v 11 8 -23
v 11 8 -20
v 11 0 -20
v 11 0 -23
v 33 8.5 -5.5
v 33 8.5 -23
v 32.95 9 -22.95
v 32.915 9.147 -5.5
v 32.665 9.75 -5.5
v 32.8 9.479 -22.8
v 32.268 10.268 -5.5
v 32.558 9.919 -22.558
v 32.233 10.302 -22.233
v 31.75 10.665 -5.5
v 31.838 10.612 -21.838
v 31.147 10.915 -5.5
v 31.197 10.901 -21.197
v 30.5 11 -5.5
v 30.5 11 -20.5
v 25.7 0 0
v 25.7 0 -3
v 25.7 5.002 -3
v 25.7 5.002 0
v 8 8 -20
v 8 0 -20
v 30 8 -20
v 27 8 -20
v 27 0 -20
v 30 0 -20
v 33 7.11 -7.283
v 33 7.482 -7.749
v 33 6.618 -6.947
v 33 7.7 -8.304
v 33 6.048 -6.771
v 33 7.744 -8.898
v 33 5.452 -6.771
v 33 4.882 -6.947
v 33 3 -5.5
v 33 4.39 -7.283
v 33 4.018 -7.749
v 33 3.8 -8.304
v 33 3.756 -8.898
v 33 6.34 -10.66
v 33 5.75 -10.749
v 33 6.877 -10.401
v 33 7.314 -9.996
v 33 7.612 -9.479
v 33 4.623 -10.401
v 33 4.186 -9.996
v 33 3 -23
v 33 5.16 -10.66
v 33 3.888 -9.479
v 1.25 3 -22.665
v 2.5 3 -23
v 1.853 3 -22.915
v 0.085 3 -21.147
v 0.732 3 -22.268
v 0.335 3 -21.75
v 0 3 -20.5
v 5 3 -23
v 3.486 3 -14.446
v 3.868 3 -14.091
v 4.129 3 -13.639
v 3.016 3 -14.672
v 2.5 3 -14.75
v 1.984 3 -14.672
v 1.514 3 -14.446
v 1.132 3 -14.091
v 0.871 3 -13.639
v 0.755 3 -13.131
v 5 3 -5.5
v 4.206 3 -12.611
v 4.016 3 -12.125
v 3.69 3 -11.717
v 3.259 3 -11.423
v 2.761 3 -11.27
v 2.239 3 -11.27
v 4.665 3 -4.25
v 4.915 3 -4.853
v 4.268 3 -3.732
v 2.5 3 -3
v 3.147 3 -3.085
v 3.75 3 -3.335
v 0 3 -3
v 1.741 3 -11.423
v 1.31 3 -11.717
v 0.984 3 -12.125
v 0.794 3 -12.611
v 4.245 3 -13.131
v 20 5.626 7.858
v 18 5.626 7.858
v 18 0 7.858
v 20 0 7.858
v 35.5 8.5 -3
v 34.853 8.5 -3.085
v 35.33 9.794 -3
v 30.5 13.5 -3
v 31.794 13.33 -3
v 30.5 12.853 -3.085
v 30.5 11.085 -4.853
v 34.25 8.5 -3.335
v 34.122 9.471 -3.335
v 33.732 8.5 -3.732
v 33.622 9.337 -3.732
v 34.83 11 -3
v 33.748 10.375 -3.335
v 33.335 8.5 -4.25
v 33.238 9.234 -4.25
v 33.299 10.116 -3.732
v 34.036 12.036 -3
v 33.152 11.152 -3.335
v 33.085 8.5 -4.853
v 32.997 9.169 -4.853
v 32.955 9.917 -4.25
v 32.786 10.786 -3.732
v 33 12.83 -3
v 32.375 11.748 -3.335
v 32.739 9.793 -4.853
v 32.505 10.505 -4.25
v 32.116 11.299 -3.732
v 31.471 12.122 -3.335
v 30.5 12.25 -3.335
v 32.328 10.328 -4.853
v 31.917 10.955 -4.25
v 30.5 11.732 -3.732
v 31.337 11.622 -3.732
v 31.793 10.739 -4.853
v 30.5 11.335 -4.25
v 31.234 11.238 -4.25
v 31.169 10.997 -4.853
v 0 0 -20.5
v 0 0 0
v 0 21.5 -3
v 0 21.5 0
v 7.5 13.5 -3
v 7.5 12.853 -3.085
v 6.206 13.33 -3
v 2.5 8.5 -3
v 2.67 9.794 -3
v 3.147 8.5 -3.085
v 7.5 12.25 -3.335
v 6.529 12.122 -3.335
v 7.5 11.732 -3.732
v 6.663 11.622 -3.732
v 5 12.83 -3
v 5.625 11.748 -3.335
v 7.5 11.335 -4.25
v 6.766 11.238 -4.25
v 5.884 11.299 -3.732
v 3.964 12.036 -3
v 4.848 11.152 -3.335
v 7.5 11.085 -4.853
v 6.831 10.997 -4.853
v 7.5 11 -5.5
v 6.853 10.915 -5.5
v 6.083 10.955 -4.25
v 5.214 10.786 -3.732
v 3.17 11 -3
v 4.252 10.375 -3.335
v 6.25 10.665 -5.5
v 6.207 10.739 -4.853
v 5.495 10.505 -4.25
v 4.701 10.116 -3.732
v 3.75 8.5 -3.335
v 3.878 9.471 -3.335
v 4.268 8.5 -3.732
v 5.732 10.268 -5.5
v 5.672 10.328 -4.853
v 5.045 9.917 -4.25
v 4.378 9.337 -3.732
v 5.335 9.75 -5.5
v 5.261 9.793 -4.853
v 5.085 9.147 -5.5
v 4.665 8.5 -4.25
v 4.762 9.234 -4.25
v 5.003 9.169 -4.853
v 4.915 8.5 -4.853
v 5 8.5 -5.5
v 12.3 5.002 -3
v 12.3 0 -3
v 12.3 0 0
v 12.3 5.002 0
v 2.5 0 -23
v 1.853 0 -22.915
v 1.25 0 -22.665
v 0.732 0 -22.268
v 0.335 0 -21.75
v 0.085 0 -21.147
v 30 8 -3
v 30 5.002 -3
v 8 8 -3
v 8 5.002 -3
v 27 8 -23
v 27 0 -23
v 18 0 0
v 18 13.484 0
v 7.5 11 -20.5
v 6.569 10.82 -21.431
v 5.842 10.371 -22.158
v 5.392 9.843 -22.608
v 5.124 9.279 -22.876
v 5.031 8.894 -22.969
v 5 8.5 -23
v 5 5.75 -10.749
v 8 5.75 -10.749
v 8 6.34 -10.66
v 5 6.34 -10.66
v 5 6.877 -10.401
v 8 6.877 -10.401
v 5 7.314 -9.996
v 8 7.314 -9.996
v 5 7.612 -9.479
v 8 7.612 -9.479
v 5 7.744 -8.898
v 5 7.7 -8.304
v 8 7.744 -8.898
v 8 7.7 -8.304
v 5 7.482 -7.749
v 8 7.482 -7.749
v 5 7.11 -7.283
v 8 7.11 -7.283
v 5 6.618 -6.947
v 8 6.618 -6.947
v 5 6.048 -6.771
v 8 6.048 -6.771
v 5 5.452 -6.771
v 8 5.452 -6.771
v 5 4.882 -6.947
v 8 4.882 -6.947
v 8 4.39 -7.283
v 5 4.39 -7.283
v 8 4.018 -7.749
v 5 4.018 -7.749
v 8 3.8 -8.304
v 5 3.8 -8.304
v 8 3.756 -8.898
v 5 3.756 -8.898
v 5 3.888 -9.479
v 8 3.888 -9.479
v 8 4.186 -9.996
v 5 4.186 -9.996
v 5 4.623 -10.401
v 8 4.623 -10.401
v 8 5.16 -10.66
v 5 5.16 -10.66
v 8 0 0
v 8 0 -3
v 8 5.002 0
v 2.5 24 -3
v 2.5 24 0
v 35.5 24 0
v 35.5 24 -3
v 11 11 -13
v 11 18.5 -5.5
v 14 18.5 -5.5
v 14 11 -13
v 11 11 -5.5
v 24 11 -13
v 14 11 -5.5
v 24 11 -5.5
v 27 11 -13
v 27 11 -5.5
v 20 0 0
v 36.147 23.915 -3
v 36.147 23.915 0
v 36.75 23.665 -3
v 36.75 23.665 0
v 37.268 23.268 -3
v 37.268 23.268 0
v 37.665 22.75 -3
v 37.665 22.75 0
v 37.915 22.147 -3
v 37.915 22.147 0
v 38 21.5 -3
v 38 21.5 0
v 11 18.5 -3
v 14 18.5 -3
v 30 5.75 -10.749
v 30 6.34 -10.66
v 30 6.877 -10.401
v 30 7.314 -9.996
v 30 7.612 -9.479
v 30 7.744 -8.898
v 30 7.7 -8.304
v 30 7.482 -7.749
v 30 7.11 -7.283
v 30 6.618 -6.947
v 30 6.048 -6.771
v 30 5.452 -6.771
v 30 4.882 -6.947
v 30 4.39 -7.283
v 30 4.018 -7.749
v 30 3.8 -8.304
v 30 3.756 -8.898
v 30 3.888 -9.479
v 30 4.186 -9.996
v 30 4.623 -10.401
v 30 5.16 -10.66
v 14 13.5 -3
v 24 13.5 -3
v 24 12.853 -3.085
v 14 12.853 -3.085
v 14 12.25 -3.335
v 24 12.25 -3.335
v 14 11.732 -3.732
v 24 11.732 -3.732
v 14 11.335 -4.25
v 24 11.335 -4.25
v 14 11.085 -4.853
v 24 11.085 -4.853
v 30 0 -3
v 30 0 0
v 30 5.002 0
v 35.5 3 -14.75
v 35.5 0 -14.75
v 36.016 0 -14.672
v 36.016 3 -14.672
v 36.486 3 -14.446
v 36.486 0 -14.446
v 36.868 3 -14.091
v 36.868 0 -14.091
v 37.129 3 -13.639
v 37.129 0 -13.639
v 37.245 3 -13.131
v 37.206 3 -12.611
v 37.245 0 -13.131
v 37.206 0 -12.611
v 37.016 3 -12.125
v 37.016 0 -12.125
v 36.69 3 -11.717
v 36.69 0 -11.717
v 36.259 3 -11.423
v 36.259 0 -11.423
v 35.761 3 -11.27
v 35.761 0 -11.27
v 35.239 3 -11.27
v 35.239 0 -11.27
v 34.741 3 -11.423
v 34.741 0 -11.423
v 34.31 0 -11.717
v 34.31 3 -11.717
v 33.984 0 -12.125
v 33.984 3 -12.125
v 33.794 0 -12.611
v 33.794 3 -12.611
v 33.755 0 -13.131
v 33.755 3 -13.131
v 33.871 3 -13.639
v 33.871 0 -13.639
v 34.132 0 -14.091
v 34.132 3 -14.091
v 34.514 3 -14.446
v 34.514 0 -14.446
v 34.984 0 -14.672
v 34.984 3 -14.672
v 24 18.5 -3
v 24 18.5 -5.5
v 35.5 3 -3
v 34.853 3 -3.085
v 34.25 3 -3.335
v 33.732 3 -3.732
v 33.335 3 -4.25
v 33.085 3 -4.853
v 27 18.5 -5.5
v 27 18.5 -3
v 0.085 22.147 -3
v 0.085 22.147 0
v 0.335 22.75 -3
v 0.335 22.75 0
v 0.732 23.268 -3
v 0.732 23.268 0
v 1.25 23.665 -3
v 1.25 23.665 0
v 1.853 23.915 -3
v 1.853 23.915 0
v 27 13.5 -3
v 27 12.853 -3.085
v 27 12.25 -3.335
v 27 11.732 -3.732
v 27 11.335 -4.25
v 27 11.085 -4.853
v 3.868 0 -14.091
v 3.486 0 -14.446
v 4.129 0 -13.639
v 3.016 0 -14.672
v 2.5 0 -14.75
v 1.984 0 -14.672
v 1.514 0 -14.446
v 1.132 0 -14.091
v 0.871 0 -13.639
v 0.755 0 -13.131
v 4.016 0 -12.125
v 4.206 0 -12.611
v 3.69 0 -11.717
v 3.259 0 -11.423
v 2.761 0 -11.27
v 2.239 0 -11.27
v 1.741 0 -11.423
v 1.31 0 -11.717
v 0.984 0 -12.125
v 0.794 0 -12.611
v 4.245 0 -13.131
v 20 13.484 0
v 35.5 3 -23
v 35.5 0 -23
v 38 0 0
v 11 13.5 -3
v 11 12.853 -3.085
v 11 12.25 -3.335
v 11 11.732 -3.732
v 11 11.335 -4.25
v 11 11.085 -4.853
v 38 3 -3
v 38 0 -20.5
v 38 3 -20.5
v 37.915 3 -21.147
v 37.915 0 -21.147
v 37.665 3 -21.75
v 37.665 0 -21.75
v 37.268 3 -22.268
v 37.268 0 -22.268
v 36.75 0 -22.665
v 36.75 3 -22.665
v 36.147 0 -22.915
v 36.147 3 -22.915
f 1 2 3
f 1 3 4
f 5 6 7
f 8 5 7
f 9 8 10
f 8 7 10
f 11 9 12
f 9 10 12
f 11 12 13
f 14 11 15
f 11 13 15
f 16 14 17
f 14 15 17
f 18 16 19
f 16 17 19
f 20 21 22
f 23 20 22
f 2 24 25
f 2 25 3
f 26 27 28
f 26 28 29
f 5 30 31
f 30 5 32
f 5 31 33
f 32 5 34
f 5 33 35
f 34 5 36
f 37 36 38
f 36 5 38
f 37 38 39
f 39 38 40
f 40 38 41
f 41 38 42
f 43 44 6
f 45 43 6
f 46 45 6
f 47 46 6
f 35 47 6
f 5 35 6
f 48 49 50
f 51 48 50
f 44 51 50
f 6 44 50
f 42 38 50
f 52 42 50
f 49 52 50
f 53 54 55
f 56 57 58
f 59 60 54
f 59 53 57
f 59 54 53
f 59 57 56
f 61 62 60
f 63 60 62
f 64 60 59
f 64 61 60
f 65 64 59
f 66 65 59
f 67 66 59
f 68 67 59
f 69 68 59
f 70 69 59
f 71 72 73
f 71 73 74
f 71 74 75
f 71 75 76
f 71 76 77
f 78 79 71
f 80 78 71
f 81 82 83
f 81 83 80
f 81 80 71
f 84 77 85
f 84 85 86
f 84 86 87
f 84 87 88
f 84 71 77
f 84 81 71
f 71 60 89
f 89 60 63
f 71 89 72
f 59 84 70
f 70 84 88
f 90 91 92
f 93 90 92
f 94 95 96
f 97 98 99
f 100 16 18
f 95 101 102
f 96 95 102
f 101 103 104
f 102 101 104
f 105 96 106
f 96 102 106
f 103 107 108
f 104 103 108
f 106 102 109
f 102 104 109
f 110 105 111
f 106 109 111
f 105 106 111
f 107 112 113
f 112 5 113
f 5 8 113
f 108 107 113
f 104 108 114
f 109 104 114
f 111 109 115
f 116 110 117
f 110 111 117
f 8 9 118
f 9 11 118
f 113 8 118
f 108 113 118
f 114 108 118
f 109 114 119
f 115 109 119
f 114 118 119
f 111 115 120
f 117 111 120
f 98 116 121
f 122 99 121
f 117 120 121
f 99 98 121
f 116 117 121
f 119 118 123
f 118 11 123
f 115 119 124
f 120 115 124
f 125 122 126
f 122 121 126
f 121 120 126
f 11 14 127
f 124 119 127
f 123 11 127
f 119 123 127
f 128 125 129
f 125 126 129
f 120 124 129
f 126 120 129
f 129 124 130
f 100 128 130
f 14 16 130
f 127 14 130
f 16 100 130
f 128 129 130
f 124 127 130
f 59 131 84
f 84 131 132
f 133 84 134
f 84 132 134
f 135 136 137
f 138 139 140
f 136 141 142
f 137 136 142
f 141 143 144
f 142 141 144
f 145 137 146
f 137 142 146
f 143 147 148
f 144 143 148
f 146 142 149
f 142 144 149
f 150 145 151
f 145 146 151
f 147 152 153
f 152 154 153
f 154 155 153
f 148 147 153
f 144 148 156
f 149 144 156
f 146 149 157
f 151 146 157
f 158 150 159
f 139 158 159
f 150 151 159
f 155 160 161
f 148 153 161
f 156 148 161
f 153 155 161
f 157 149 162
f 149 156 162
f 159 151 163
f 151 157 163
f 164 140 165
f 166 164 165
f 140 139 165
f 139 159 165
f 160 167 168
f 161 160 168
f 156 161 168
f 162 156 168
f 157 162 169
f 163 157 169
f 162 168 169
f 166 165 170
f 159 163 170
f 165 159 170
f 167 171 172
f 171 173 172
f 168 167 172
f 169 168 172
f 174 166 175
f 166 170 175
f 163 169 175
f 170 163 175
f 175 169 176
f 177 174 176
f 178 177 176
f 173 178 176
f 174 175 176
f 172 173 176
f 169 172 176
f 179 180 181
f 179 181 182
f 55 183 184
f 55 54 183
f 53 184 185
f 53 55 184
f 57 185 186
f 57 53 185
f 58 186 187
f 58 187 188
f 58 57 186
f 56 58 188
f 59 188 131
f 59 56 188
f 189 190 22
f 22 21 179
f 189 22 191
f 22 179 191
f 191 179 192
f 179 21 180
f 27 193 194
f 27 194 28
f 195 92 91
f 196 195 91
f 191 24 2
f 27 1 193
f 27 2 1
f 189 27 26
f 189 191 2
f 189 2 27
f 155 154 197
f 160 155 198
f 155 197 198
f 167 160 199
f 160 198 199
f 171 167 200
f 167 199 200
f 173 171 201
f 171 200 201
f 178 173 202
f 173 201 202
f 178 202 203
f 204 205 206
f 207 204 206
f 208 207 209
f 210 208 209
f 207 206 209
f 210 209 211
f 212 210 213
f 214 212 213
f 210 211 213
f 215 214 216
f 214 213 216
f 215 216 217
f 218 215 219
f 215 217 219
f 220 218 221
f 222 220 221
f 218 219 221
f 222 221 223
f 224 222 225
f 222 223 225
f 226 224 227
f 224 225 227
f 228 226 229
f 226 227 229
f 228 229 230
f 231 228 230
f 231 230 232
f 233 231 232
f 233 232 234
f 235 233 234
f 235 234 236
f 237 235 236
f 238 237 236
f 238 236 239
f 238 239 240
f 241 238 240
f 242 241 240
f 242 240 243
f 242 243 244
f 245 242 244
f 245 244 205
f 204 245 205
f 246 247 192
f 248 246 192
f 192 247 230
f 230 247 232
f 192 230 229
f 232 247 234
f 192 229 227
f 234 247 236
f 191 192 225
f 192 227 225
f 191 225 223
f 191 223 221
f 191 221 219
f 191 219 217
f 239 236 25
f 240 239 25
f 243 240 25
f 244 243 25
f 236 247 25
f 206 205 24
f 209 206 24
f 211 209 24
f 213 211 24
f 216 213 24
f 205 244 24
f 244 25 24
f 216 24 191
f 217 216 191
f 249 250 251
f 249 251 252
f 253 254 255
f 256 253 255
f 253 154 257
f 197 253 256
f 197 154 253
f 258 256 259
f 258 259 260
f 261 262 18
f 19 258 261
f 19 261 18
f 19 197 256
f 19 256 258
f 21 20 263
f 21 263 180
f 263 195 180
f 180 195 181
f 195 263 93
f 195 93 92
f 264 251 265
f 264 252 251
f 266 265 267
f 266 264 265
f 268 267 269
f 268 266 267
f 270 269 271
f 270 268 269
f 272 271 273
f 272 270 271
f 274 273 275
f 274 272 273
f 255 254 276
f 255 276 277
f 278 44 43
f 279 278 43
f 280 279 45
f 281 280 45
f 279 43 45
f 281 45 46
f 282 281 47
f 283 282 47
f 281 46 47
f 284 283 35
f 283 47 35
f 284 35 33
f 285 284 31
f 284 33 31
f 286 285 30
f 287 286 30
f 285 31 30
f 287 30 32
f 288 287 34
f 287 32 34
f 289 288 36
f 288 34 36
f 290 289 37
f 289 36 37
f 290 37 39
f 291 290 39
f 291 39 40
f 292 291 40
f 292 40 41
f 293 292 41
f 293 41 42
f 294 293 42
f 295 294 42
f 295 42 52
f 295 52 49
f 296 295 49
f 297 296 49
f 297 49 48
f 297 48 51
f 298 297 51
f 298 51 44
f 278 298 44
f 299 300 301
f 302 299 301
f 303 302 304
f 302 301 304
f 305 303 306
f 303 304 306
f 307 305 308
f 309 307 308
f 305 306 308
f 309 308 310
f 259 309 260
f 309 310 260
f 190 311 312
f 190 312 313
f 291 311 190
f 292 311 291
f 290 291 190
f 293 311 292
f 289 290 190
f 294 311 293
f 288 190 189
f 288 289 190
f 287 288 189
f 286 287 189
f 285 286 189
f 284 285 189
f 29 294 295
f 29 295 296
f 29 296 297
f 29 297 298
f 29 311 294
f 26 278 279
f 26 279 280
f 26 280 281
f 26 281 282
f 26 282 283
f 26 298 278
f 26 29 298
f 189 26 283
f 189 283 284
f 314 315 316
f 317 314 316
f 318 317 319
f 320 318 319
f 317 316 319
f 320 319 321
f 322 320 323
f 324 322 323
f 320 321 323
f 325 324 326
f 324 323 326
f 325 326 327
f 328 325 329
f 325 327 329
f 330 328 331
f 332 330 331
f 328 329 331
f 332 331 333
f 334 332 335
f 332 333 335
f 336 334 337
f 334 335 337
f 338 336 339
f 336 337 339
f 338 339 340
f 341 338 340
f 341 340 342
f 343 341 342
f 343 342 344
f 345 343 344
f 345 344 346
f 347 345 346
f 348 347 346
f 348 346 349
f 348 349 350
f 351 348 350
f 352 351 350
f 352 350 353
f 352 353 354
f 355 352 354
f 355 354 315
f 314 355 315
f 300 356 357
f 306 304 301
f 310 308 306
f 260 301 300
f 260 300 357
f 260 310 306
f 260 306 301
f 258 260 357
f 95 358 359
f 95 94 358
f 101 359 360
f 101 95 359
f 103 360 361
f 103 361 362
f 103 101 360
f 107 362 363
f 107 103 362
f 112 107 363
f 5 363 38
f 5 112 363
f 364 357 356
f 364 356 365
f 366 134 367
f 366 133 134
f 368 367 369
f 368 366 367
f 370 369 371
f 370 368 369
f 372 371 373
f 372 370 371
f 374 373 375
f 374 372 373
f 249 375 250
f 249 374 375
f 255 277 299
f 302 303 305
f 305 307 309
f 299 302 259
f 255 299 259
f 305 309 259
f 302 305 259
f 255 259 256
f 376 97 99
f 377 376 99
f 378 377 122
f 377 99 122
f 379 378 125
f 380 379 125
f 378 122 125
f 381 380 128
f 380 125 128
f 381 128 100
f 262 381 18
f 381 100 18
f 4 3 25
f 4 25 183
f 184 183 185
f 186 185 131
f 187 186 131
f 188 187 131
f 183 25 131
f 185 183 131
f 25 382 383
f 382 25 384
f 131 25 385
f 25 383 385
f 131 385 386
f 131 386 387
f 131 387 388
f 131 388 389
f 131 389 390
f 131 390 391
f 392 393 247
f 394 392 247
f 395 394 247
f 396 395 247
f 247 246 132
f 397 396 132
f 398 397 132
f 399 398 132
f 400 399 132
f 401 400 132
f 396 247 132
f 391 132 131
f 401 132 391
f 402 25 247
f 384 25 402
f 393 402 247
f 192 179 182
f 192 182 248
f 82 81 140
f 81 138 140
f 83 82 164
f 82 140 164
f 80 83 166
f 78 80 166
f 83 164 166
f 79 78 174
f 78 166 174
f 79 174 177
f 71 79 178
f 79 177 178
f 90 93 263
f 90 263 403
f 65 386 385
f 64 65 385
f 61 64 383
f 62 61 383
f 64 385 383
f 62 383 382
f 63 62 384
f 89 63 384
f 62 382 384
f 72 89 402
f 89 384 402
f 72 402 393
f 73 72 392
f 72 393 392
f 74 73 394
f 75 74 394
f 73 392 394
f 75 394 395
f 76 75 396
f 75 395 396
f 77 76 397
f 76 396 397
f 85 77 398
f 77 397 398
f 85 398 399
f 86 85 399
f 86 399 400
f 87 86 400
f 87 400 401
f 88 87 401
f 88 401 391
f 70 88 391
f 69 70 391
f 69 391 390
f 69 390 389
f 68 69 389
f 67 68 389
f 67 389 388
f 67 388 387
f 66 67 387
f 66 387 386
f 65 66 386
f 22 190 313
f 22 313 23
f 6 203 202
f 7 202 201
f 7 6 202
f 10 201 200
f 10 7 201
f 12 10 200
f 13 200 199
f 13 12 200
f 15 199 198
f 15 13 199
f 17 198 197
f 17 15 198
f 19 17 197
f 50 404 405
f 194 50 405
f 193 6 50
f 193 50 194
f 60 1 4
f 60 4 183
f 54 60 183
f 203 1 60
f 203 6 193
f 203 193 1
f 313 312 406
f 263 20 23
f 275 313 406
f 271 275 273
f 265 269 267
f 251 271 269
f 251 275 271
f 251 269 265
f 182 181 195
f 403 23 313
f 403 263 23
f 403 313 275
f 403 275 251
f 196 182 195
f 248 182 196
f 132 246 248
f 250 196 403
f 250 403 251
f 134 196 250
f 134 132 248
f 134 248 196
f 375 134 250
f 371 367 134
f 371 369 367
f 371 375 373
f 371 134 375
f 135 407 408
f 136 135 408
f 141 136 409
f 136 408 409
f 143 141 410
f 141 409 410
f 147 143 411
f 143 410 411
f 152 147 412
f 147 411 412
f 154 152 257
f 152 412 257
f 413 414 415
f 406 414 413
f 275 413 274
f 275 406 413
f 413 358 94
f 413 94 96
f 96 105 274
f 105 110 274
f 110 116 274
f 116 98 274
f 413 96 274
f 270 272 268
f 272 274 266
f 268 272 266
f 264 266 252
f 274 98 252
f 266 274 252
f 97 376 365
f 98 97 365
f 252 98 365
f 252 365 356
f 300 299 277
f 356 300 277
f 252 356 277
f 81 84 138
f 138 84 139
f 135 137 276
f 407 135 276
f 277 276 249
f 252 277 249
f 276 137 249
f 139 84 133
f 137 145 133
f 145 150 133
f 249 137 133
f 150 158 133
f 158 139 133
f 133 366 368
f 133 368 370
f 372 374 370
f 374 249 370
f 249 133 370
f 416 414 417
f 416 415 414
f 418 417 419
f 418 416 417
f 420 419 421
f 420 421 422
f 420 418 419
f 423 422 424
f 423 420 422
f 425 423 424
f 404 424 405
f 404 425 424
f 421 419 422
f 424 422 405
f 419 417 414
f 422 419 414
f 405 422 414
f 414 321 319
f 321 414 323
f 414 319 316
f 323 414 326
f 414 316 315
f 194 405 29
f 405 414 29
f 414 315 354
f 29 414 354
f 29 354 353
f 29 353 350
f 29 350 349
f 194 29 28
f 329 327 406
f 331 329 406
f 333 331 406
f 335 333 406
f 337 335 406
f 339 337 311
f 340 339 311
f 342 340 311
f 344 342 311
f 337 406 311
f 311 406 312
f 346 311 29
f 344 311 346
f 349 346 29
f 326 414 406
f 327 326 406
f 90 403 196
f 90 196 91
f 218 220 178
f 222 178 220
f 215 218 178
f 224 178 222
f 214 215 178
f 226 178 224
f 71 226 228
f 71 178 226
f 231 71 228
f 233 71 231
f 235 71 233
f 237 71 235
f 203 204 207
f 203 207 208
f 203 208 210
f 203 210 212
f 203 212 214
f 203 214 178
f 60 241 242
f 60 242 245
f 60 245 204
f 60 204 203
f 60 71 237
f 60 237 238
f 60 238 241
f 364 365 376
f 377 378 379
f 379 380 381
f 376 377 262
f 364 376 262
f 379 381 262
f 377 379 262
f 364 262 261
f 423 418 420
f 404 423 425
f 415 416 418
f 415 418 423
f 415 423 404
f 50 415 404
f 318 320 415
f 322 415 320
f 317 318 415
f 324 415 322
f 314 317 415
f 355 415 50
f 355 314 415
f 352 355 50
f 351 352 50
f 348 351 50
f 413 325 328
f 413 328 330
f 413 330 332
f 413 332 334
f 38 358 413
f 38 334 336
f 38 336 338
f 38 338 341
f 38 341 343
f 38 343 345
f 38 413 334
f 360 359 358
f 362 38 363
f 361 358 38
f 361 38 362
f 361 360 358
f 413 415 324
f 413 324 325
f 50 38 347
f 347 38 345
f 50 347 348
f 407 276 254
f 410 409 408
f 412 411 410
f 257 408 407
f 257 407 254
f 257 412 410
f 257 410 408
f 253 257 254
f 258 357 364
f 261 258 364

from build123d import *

# Parameters (mm, degrees)
SKETCH1_W           = 3
SKETCH1_H           = 24
BOSS_EXTRUDE1_DEPTH = 38
SKETCH2_W           = 2
SKETCH2_H           = 13.483919992
BOSS_EXTRUDE2_DEPTH = 20
CHAMFER1_SIZE       = 20
SKETCH3_W           = 38
SKETCH3_H           = 3
BOSS_EXTRUDE3_DEPTH = 20
SKETCH4_R           = 1.75
CUT_EXTRUDE1_DEPTH  = 51.487622245
SKETCH5_W           = 28
SKETCH5_H           = 20
BOSS_EXTRUDE4_DEPTH = 8
CUT_EXTRUDE2_DEPTH  = 8
SKETCH7_W           = 4.299558672
SKETCH7_H           = 5.002260433
CUT_EXTRUDE3_DEPTH  = 15
CUT_EXTRUDE4_DEPTH  = 15
FILLET3_R           = 2.5
SKETCH9_W           = 3
SKETCH9_H           = 10
BOSS_EXTRUDE5_DEPTH = 7.5
CHAMFER2_SIZE       = 7.5
FILLET4_R           = 2.5
SKETCH11_R          = 2
CUT_EXTRUDE5_DEPTH  = 47.840153715


# Some blends are built 0.0001 mm under size
with BuildPart() as part:
    # Sketch1 → Boss-Extrude1 (new body)
    with BuildSketch(Plane(origin=(0, 0, 0), x_dir=(0, 0, -1), z_dir=(1, 0, 0))):
        with Locations((1.5, 12)):
            Rectangle(SKETCH1_W, SKETCH1_H)
    extrude(amount=BOSS_EXTRUDE1_DEPTH)

    # Sketch2 → Boss-Extrude2 (add)
    with BuildSketch(Plane.XY):
        with Locations((19, 6.741959996)):
            Rectangle(SKETCH2_W, SKETCH2_H)
    extrude(amount=BOSS_EXTRUDE2_DEPTH)

    # Chamfer1
    # the kernel refuses this chamfer: 20 mm, written as the material it takes off along each edge
    with BuildSketch(Plane(origin=(71.433659759, 13.483919992, 20), x_dir=(0, 0.027495876610586403, -0.9996219169112968), z_dir=(-1, 0, 0))) as chamfer1_piece_1_section:
        Polygon((CHAMFER1_SIZE * 0.999621916911, CHAMFER1_SIZE * 0.0274958766106), (-CHAMFER1_SIZE * 0.0274958766106, CHAMFER1_SIZE * 0.999621916911), (0, 0), align=None)
    chamfer1_piece_1 = extrude(amount=104.867319519, mode=Mode.PRIVATE)
    chamfer1_piece_1 = split(chamfer1_piece_1, bisect_by=Plane(origin=(19, 6.875836906, 0), z_dir=(0, 0, 1)), keep=Keep.TOP, mode=Mode.PRIVATE)
    add(chamfer1_piece_1, mode=Mode.SUBTRACT)

    # Sketch3 → Boss-Extrude3 (add)
    with BuildSketch(Plane(origin=(0, 0, -3), x_dir=(-1, 0, 0), z_dir=(0, 0, -1))):
        with Locations((-19, 1.5)):
            Rectangle(SKETCH3_W, SKETCH3_H)
    extrude(amount=BOSS_EXTRUDE3_DEPTH)

    # Sketch4 → Cut-Extrude1 (cut, through all)
    with BuildSketch(Plane.XZ):
        with Locations(Location((2.5, -13, 0), (0, 0, 270))):
            Circle(SKETCH4_R)
        with Locations(Location((35.5, -13, 0), (0, 0, 270))):
            Circle(SKETCH4_R)
    extrude(amount=-CUT_EXTRUDE1_DEPTH, mode=Mode.SUBTRACT)

    # Sketch5 → Boss-Extrude4 (add)
    with BuildSketch(Plane(origin=(0, 3, 0), x_dir=(1, 0, 0), z_dir=(0, 1, 0))):
        with Locations((19, 13)):
            Rectangle(SKETCH5_W, SKETCH5_H)
    extrude(amount=BOSS_EXTRUDE4_DEPTH)

    # Sketch6 → Cut-Extrude2 (cut)
    with BuildSketch(Plane.XZ):
        Polygon((11, -23), (27, -23), (27, -20), (30, -20), (30, -3), (8, -3), (8, -20), (11, -20), align=None)
    extrude(amount=-CUT_EXTRUDE2_DEPTH, mode=Mode.SUBTRACT)

    # Sketch7 → Cut-Extrude3 (cut)
    with BuildSketch(Plane(origin=(0, 0, -3), x_dir=(-1, 0, 0), z_dir=(0, 0, -1))):
        with Locations((-27.850220664, 2.501130217)):
            Rectangle(SKETCH7_W, SKETCH7_H)
        with Locations((-10.149779336, 2.501130217)):
            Rectangle(SKETCH7_W, SKETCH7_H)
    extrude(amount=-CUT_EXTRUDE3_DEPTH, mode=Mode.SUBTRACT)

    # Sketch8 → Cut-Extrude4 (cut)
    with BuildSketch(Plane.ZY.offset(-18)):
        Polygon((7.858304832, 5.62561516), (7.858304832, 0), (13.483919992, 0), align=None)
    extrude(amount=-CUT_EXTRUDE4_DEPTH, mode=Mode.SUBTRACT)

    # Fillet3
    fillet3_edges = [part.edges().sort_by_distance(p)[0] for p in [
        (38, 1.5, -23),
        (0, 1.5, -23),
        (5, 7, -3),
        (33, 7, -3),
        (5, 11, -13),
        (19, 11, -3),
        (33, 11, -13),
        (19, 11, -23),
    ]]
    fillet(fillet3_edges, radius=FILLET3_R)

    # Sketch9 → Boss-Extrude5 (add)
    with BuildSketch(Plane(origin=(0, 11, 0), x_dir=(1, 0, 0), z_dir=(0, 1, 0))):
        with Locations((12.5, 8)):
            Rectangle(SKETCH9_W, SKETCH9_H)
        with Locations((25.5, 8)):
            Rectangle(SKETCH9_W, SKETCH9_H)
    extrude(amount=BOSS_EXTRUDE5_DEPTH)

    # Chamfer2
    chamfer2_edges = [part.edges().sort_by_distance(p)[0] for p in [
        (12.5, 18.5, -13),
        (25.5, 18.5, -13),
    ]]
    chamfer(chamfer2_edges, length=CHAMFER2_SIZE - 0.0001)  # a hair under: the kernel refuses the full size

    # Fillet4
    fillet4_edges = [part.edges().sort_by_distance(p)[0] for p in [
        (38, 24, -1.5),
        (0, 24, -1.5),
    ]]
    fillet(fillet4_edges, radius=FILLET4_R)

    # Sketch11 → Cut-Extrude5 (cut, through all)
    with BuildSketch(Plane(origin=(33, 0, 0), x_dir=(0, 0, -1), z_dir=(1, 0, 0))):
        with Locations((8.74878855, 5.75)):
            Circle(SKETCH11_R)
    extrude(amount=-CUT_EXTRUDE5_DEPTH, mode=Mode.SUBTRACT)


solid = part.part
